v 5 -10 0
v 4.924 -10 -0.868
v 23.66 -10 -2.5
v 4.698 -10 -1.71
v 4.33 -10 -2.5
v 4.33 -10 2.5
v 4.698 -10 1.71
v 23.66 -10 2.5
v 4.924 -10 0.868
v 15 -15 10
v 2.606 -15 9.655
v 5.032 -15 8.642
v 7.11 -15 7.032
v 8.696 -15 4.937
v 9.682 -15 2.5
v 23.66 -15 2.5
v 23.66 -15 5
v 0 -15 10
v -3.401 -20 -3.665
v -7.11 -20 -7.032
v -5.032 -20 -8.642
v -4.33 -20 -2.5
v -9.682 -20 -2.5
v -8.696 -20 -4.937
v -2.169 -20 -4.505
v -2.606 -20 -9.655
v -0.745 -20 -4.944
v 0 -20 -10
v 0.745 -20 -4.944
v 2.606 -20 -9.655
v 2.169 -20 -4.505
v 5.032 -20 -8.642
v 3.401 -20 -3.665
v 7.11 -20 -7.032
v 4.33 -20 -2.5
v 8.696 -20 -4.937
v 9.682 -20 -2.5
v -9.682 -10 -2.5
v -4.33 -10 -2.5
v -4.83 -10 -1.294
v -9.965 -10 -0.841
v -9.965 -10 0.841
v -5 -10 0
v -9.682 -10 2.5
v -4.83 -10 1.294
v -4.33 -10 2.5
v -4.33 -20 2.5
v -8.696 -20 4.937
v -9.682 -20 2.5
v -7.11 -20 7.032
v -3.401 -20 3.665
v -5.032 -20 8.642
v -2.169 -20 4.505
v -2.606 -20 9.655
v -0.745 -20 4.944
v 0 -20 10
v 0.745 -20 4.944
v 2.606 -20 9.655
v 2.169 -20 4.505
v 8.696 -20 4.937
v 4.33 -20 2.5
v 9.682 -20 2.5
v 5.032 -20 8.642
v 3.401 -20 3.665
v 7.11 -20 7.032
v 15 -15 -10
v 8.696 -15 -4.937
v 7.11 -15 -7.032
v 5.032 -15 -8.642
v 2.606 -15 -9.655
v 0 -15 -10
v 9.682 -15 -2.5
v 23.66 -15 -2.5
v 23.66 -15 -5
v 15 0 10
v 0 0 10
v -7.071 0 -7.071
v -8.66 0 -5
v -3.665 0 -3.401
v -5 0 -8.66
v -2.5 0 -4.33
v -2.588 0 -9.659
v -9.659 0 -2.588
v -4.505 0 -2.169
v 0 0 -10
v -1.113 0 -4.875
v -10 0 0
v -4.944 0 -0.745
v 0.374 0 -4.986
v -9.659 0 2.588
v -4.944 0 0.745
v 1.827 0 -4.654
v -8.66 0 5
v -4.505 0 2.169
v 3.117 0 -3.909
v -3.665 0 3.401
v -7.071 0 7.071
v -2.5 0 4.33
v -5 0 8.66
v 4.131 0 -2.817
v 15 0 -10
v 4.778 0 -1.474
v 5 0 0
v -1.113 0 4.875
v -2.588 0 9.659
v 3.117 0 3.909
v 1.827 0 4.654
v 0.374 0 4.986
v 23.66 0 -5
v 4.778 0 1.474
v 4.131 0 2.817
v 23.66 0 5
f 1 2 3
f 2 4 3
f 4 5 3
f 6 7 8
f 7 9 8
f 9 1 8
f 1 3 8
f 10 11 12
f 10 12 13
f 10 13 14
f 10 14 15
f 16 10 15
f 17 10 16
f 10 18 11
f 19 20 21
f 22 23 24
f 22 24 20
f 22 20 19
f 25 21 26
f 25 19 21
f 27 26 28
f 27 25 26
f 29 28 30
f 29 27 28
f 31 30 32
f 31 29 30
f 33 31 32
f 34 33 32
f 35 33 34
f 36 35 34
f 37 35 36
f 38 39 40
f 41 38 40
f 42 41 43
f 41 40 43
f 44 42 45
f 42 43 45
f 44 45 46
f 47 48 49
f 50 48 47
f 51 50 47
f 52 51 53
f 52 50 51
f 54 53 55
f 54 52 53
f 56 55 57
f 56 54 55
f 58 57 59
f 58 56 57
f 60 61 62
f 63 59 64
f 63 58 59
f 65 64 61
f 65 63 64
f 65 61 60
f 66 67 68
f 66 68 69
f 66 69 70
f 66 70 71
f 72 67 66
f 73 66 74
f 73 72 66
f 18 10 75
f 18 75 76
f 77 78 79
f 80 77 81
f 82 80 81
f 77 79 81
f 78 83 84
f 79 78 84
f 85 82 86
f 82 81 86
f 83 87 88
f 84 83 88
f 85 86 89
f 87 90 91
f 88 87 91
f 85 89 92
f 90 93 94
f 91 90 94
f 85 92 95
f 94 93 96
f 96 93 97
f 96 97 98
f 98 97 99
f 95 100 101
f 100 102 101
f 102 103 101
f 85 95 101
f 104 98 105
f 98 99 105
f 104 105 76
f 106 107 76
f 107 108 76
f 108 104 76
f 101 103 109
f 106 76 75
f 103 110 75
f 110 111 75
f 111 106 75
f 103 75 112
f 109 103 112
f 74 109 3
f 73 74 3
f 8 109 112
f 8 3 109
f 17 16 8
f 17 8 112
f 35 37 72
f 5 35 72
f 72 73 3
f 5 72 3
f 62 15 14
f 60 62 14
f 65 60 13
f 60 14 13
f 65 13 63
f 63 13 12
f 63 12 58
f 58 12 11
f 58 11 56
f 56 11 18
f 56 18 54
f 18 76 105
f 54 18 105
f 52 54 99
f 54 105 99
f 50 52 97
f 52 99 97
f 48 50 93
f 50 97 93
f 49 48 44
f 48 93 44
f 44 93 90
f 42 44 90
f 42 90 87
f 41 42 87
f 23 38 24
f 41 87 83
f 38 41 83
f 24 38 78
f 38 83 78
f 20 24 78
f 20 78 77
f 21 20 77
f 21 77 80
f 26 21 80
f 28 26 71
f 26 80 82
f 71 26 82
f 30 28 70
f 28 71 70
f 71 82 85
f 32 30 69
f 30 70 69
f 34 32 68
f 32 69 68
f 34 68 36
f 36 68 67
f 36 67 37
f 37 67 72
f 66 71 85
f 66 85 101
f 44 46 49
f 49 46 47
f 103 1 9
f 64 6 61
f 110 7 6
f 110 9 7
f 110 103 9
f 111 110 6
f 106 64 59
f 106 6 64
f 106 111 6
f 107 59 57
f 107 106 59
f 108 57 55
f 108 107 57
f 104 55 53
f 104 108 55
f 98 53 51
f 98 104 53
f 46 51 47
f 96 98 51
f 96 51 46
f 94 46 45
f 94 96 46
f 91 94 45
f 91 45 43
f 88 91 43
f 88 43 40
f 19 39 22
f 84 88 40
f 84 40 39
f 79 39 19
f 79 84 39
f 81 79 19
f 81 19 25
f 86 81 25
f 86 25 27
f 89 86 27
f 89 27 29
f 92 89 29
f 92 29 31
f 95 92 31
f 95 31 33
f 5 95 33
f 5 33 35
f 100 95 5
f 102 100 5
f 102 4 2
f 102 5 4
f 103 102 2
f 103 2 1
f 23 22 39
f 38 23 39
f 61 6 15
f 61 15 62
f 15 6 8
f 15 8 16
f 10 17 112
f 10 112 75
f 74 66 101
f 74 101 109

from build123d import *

# Parameters (mm, degrees)
F0_R     = 10
F0_R_2   = 5
F1_DEPTH = 20
F3_START = -5
F3_DEPTH = 15
F4_W     = 5
F4_H     = 5
F5_DEPTH = 33.6612540378


with BuildPart() as f1:
    # F0 (on Front) → F1 (new body)
    with BuildSketch(Plane.XZ):
        Circle(F0_R)
        Circle(F0_R_2, mode=Mode.SUBTRACT)
    extrude(amount=F1_DEPTH)

    # F2 (on face) → F3 (join)
    with BuildSketch(Plane.XZ.offset(20).offset(F3_START)):
        Polygon((23.6602540378, 5), (15, 10), (15, -10), (23.6602540378, -5), align=None)
        with BuildLine():
            Line((15, 10), (0, 10))
            ThreePointArc((0, 10), (7.0710678119, 7.0710678119), (10, 0))
            ThreePointArc((10, 0), (7.0710678119, -7.0710678119), (0, -10))
            Line((0, -10), (15, -10))
            Line((15, -10), (15, 10))
        make_face()
    extrude(amount=-F3_DEPTH)

    # F4 (on face) → F5 (cut, through all)
    with BuildSketch(Plane.YZ.offset(23.6602540378)):
        with Locations((-12.5, 0)):
            Rectangle(F4_W, F4_H)
        with Locations((-17.5, 0)):
            Rectangle(F4_W, F4_H)
    extrude(amount=-F5_DEPTH, mode=Mode.SUBTRACT)


solid = f1.part
